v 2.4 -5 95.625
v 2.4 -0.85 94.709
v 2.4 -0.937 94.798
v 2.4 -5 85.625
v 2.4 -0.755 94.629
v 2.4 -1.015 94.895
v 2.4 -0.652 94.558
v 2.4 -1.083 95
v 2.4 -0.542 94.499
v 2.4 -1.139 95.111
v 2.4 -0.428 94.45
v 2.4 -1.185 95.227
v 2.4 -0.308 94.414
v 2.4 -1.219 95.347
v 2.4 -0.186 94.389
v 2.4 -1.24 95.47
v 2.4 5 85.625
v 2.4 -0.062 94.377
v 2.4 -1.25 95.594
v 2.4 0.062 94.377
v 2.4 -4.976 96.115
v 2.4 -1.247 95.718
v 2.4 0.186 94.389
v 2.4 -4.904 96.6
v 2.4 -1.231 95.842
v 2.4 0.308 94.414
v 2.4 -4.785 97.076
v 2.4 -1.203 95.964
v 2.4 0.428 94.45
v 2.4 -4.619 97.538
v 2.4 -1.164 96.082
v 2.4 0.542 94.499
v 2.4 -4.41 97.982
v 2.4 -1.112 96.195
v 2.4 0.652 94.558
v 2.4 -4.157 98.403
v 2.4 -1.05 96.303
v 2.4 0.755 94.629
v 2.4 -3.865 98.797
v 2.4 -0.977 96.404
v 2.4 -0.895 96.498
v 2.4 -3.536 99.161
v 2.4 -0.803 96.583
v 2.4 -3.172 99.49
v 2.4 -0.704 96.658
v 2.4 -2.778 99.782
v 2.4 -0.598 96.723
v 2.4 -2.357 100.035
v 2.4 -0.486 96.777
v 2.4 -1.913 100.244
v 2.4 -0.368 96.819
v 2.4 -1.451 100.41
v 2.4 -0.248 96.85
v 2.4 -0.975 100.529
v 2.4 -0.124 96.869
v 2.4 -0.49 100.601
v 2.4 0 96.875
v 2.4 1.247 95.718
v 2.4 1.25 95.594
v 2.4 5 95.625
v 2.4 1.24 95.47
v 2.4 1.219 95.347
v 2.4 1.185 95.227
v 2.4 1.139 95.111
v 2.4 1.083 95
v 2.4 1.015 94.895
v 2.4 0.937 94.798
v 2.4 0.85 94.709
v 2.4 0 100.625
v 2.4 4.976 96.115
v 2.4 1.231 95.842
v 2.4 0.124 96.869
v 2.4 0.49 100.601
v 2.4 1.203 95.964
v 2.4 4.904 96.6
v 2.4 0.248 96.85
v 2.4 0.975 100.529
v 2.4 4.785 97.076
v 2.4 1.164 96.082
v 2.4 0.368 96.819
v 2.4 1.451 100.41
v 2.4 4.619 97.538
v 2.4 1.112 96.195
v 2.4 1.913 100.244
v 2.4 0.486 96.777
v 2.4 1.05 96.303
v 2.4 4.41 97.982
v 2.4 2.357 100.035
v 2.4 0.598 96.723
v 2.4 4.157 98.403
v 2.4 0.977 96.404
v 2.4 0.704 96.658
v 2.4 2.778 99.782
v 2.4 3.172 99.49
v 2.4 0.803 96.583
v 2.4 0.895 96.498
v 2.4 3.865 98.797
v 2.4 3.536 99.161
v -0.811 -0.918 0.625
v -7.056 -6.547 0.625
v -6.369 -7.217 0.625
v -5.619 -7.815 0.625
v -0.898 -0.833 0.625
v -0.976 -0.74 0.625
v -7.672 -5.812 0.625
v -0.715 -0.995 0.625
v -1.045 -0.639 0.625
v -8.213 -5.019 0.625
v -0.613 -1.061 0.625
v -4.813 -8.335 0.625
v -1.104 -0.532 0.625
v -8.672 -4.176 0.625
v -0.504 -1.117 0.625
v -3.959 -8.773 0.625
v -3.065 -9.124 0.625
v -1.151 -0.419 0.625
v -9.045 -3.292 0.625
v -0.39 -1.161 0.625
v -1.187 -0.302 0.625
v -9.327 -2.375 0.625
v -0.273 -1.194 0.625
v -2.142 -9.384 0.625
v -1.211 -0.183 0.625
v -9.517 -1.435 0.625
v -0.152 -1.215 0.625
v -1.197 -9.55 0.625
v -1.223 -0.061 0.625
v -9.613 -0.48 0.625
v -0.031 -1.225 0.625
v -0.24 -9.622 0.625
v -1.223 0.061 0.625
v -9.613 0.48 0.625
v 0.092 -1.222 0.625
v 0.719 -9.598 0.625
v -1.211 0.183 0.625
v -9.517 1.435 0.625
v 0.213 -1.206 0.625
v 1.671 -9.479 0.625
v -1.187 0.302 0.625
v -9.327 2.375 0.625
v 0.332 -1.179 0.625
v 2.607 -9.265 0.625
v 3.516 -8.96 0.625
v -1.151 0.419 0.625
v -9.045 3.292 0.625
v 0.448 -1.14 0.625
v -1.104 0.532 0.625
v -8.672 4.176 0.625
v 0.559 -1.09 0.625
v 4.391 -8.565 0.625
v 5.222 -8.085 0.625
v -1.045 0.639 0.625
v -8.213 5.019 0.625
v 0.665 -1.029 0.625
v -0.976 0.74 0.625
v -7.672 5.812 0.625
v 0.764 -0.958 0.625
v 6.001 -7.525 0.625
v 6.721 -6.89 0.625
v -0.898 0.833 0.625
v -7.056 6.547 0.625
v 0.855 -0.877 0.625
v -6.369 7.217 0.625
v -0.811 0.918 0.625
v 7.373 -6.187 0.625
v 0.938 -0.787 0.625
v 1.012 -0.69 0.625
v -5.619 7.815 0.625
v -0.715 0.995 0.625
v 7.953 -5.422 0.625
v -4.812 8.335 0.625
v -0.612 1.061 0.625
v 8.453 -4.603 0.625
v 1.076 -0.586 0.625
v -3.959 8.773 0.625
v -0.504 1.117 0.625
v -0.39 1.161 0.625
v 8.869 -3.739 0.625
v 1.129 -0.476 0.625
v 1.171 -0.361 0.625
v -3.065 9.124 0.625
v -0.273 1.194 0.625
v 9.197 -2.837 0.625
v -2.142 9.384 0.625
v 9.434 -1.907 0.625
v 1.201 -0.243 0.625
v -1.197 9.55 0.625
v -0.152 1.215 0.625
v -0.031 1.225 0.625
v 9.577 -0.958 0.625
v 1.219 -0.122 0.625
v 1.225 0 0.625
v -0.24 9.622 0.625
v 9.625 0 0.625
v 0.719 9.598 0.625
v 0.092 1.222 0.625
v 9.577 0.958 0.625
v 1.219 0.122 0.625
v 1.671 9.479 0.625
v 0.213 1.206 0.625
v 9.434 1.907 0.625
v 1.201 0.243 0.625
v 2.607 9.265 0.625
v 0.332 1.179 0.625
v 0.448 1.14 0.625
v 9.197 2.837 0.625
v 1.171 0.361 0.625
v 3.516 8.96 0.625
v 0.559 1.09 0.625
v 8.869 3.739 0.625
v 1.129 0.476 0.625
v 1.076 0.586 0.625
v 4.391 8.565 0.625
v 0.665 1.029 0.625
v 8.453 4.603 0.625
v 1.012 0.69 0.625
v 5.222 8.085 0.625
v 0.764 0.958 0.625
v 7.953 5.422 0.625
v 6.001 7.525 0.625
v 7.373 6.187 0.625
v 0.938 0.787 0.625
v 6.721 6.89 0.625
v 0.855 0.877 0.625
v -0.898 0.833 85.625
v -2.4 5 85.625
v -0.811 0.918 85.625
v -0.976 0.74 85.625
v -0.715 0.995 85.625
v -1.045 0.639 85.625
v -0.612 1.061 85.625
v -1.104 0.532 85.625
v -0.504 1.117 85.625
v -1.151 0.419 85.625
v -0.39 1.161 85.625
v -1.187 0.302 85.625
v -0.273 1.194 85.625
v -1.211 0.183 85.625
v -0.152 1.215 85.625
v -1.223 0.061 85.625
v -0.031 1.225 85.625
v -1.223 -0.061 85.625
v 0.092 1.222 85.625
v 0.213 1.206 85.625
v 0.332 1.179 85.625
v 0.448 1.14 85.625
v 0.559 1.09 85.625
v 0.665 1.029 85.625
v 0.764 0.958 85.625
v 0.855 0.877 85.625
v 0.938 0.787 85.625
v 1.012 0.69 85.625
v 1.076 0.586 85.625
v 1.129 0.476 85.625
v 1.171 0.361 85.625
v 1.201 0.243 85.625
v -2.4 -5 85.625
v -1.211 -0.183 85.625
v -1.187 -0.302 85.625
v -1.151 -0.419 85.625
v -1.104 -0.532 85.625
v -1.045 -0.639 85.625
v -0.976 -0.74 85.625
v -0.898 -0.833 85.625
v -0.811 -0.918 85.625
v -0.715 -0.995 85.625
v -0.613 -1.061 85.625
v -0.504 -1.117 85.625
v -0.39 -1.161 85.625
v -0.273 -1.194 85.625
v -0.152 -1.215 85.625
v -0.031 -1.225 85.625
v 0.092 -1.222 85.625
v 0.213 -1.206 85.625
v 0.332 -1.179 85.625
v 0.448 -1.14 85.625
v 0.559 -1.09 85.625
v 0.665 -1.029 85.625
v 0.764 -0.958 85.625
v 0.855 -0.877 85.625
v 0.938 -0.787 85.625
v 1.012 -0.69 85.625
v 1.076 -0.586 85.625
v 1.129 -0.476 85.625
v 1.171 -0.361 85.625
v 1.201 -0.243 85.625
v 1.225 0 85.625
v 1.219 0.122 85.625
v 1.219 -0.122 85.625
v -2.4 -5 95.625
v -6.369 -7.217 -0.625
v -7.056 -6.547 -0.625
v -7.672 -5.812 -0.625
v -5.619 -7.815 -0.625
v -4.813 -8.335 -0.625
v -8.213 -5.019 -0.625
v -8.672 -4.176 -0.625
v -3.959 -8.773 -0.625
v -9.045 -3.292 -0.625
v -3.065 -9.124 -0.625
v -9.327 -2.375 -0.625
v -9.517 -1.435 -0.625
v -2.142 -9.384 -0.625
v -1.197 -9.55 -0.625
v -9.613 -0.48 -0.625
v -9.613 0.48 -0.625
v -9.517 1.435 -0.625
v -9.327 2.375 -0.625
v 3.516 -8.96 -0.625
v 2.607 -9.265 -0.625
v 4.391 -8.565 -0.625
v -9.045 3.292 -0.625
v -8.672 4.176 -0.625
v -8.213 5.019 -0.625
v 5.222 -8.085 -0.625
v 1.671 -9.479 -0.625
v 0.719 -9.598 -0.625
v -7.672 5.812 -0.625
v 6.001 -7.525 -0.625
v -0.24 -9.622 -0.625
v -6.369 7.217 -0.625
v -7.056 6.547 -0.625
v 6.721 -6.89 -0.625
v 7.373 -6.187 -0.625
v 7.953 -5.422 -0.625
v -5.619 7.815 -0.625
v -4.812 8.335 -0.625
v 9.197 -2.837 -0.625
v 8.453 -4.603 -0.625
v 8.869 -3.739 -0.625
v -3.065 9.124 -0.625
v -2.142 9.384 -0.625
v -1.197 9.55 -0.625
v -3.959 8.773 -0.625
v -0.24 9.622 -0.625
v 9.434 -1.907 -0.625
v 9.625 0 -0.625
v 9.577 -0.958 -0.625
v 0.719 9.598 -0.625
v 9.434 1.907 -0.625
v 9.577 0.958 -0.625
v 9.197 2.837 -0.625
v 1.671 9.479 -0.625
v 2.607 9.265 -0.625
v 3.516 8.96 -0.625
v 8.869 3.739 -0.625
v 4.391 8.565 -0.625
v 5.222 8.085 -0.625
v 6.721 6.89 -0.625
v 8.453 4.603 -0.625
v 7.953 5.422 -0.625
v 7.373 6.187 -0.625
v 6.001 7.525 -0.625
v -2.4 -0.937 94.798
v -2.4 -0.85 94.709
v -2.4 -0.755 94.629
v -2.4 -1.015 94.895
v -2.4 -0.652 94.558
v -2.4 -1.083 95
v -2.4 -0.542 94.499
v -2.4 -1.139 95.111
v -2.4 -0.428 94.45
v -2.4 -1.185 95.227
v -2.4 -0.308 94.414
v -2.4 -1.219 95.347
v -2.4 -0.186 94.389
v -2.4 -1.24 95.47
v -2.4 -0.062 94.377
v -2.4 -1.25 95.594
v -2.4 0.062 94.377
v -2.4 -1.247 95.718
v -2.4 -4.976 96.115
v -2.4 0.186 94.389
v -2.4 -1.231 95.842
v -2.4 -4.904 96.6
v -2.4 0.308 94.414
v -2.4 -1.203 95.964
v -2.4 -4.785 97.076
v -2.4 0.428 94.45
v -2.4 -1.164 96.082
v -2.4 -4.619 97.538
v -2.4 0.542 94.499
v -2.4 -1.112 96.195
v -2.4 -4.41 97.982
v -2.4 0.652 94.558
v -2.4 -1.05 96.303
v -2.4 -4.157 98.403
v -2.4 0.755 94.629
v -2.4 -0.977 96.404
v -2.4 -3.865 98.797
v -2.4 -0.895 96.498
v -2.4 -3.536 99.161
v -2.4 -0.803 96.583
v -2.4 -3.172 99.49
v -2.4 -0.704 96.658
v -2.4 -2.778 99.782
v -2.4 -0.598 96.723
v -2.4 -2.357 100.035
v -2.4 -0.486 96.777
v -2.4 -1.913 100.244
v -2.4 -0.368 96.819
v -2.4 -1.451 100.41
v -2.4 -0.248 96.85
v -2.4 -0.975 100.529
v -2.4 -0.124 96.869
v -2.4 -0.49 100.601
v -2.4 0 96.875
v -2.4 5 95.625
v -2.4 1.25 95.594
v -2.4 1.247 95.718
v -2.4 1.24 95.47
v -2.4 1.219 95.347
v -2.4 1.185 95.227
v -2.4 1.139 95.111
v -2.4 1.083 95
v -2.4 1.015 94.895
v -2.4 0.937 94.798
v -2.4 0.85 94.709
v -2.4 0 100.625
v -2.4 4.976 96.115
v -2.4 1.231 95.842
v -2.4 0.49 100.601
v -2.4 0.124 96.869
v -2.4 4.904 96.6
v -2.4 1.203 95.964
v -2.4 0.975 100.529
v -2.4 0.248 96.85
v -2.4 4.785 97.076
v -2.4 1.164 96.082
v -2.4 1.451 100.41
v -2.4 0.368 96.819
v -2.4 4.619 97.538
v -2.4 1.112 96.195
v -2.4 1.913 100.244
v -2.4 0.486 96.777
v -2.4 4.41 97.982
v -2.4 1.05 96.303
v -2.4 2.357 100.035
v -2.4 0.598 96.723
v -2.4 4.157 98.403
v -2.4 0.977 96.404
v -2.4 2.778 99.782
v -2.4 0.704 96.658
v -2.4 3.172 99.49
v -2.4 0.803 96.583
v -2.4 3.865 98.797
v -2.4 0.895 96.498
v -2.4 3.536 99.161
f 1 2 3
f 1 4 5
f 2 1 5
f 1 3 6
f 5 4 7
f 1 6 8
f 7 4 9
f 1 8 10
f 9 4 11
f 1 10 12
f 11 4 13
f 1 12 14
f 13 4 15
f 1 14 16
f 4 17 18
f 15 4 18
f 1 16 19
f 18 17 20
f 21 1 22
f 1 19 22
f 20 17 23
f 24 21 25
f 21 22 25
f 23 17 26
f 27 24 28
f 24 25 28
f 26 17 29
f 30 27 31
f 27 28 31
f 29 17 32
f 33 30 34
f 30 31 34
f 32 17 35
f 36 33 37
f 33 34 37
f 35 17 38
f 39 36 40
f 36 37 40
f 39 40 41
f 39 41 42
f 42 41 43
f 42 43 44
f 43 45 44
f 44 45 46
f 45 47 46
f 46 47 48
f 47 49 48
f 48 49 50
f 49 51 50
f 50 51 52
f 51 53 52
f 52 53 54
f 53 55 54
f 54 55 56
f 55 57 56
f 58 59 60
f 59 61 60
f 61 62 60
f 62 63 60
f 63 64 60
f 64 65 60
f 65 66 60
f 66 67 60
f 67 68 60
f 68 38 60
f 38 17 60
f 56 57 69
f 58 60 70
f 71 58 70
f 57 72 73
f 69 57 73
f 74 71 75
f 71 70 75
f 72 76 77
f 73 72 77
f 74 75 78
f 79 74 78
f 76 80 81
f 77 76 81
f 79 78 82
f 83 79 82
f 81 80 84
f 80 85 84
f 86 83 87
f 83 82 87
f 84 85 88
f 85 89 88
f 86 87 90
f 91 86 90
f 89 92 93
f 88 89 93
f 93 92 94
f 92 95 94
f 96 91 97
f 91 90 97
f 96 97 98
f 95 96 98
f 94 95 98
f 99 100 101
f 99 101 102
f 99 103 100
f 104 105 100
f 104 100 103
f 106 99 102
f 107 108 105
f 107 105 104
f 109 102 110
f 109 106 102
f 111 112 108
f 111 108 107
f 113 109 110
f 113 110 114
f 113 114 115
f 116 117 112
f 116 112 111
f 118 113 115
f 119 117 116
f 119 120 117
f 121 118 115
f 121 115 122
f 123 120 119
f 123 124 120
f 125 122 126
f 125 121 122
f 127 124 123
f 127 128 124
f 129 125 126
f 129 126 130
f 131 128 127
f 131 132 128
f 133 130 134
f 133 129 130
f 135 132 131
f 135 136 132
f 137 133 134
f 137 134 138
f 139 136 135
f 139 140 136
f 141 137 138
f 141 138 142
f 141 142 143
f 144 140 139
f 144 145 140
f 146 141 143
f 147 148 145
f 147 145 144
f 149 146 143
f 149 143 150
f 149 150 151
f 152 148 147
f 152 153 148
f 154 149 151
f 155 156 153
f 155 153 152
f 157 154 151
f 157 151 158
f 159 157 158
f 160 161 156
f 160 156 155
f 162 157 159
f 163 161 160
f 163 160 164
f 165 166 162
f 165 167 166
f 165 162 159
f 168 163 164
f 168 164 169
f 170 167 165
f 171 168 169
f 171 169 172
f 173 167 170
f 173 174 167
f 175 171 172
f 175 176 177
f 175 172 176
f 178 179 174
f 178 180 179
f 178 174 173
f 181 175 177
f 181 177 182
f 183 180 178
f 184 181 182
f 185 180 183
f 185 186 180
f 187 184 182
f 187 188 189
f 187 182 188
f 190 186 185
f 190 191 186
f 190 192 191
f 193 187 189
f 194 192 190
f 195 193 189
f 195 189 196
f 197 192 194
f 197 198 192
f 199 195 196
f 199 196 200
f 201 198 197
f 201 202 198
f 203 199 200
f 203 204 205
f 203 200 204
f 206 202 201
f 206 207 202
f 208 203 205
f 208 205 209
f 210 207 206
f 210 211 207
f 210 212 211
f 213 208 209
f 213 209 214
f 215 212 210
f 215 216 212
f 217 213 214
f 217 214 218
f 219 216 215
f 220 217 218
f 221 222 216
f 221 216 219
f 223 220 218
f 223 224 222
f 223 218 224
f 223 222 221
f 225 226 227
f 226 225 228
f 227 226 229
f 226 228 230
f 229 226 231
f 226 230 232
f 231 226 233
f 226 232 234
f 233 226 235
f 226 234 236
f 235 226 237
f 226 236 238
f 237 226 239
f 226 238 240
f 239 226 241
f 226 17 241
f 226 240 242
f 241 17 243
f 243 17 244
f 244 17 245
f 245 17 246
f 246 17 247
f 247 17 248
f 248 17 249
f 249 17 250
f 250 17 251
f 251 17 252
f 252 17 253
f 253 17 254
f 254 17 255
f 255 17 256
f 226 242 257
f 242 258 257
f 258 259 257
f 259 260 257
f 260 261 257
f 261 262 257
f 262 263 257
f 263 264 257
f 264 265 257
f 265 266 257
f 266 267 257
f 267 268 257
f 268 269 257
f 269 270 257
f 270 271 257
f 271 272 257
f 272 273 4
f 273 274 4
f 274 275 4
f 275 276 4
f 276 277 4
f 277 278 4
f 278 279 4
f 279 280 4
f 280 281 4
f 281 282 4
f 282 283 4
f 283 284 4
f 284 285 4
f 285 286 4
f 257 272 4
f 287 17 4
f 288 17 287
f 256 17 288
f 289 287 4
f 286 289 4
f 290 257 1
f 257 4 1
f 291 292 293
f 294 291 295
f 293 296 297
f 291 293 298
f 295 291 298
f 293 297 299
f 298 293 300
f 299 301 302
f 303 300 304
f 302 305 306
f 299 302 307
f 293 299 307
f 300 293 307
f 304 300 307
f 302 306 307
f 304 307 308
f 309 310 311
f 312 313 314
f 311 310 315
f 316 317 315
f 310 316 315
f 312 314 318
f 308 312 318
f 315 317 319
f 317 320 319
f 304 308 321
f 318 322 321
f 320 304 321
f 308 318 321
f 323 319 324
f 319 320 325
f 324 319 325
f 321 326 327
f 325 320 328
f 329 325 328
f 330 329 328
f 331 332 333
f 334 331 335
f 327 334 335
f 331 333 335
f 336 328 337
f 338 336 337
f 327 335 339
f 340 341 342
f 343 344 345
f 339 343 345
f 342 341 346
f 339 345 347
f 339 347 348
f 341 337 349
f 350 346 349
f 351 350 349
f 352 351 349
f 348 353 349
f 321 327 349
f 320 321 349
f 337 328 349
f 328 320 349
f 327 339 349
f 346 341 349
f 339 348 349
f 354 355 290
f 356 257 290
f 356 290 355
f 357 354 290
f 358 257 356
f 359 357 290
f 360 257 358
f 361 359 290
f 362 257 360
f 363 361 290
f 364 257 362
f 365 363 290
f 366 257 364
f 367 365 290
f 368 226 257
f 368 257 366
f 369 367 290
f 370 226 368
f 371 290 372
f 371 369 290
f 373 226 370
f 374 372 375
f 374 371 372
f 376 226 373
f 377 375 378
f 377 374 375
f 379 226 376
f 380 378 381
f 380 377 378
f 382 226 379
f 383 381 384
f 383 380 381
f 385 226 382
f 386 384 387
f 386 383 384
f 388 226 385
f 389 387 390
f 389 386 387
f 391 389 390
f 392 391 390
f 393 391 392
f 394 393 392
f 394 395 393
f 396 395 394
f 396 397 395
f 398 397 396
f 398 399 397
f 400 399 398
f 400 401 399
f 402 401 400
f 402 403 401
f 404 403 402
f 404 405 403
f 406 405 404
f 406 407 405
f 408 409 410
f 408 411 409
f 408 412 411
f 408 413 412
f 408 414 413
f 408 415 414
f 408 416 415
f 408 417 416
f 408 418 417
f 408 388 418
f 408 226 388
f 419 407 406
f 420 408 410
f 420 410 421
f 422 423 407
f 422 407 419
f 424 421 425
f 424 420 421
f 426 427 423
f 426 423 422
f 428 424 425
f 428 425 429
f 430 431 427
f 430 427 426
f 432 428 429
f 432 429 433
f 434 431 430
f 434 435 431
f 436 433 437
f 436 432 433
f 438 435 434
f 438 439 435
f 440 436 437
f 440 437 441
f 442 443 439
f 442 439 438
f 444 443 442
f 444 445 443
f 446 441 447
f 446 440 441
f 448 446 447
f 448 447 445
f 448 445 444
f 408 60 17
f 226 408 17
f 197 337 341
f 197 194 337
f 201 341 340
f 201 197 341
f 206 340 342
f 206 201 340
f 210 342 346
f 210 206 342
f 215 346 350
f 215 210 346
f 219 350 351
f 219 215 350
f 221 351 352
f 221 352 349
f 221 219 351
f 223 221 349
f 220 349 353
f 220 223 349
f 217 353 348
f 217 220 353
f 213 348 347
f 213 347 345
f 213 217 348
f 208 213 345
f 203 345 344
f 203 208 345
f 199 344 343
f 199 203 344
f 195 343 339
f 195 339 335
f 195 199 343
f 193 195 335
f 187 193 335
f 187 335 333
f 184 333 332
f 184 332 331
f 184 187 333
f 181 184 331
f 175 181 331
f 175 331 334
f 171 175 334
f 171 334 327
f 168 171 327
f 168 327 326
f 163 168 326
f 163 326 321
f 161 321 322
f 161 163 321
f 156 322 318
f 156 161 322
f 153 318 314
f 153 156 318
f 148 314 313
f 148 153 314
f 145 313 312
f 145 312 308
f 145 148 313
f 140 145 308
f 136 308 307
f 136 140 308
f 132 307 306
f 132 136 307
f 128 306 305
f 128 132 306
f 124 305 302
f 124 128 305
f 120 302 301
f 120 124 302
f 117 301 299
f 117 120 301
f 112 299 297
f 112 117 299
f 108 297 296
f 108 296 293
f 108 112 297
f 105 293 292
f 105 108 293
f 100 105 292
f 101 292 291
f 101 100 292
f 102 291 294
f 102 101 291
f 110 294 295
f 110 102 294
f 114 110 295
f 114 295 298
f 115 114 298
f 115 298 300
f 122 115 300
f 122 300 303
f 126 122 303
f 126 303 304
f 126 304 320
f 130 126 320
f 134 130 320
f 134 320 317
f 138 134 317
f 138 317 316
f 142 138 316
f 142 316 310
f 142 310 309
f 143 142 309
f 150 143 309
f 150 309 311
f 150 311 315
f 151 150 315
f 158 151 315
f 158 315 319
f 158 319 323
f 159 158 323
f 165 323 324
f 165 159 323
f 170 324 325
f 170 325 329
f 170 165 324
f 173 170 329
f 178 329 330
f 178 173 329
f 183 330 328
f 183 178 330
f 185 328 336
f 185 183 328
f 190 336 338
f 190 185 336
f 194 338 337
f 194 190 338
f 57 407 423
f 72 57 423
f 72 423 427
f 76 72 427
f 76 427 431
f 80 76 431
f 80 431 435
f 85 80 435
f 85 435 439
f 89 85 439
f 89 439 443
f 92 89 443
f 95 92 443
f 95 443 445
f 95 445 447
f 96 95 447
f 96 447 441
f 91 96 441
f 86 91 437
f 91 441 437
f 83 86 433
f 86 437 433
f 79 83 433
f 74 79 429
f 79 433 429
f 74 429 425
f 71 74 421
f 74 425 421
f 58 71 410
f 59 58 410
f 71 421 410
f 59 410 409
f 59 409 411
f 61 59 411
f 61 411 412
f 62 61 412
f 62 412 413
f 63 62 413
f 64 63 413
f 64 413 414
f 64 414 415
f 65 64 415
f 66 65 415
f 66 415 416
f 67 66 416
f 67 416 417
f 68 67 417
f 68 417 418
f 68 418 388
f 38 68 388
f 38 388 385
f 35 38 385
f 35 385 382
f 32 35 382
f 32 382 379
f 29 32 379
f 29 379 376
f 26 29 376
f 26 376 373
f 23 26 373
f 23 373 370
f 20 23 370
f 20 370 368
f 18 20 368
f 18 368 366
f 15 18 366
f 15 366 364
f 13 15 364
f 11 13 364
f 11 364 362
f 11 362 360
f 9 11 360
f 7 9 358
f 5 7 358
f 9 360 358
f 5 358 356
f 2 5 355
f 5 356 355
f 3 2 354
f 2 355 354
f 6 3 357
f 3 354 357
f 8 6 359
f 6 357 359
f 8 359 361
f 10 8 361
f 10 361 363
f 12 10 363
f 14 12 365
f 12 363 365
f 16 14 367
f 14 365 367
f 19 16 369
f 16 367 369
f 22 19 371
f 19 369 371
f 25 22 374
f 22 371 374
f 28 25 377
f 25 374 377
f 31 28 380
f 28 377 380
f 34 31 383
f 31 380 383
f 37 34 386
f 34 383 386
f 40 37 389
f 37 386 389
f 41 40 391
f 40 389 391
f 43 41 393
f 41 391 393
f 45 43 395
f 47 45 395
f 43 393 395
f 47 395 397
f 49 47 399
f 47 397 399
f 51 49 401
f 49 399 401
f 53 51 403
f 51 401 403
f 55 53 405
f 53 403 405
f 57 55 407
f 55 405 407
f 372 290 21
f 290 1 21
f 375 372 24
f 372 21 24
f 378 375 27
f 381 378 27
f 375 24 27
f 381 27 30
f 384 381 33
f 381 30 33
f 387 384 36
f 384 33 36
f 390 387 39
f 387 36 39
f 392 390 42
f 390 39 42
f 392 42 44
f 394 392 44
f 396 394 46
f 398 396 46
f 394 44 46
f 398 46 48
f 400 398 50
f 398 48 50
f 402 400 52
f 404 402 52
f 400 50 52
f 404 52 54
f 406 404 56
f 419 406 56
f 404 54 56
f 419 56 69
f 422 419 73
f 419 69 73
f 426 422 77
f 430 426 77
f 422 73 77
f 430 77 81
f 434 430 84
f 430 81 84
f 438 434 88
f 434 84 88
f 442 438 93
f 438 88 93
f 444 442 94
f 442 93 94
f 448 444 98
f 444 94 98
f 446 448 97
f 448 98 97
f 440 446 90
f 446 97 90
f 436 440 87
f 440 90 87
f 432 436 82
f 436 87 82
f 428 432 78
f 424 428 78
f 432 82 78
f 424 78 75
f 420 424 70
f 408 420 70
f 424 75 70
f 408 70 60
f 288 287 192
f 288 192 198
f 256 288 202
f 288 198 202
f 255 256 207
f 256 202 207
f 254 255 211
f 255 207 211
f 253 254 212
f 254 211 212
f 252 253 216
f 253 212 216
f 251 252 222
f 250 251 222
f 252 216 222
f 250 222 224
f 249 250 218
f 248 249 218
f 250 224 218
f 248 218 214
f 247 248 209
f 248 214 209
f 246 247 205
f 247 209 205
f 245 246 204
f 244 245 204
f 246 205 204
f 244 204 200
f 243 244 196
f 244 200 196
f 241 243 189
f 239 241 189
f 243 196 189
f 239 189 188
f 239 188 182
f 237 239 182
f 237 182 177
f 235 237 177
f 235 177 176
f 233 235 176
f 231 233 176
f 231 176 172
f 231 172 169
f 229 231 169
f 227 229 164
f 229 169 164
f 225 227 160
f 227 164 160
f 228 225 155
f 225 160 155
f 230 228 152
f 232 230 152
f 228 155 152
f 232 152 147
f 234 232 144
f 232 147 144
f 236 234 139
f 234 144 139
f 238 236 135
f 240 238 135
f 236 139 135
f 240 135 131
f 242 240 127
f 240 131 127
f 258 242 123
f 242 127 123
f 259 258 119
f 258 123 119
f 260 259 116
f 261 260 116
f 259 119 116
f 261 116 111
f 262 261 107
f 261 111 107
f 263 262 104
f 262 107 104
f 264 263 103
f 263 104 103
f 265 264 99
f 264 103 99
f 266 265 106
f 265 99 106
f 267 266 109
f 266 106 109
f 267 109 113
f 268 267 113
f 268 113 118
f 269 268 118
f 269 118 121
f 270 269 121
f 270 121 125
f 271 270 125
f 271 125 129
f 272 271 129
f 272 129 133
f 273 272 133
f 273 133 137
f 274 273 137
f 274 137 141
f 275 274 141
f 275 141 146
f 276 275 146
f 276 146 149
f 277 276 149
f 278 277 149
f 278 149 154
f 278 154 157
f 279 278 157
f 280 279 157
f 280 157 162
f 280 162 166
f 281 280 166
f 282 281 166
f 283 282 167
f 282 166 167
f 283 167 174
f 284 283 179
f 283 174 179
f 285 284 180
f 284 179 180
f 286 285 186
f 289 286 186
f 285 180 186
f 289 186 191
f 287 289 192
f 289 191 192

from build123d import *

# Parameters (mm, degrees)
SKETCH1_R           = 9.625
BOSS_EXTRUDE1_DEPTH = 0.625
SKETCH2_R           = 1.225
BOSS_EXTRUDE2_DEPTH = 85
BOSS_EXTRUDE3_DEPTH = 2.4
SKETCH4_R           = 1.25
CUT_EXTRUDE1_DEPTH  = 10


with BuildPart() as part:
    # Sketch1 → Boss-Extrude1 (new, symmetric)
    with BuildSketch(Plane.XY):
        Circle(SKETCH1_R)
    extrude(amount=BOSS_EXTRUDE1_DEPTH, both=True)

    # Sketch2 → Boss-Extrude2 (add)
    with BuildSketch(Plane.XY.offset(0.625)):
        Circle(SKETCH2_R)
    extrude(amount=BOSS_EXTRUDE2_DEPTH)

    # Sketch3 → Boss-Extrude3 (add, symmetric)
    with BuildSketch(Plane(origin=(0, 0, 0), x_dir=(0, 0, -1), z_dir=(1, 0, 0))):
        with BuildLine():
            Line((-85.625, 5), (-85.625, -5))
            Line((-85.625, -5), (-95.625, -5))
            ThreePointArc((-95.625, -5), (-100.625, 0), (-95.625, 5))
            Line((-95.625, 5), (-85.625, 5))
        make_face()
    extrude(amount=BOSS_EXTRUDE3_DEPTH, both=True)

    # Sketch4 → Cut-Extrude1 (cut)
    with BuildSketch(Plane.ZY.offset(2.4)):
        with Locations((95.625, 0)):
            Circle(SKETCH4_R)
    extrude(amount=-CUT_EXTRUDE1_DEPTH, mode=Mode.SUBTRACT)


solid = part.part
